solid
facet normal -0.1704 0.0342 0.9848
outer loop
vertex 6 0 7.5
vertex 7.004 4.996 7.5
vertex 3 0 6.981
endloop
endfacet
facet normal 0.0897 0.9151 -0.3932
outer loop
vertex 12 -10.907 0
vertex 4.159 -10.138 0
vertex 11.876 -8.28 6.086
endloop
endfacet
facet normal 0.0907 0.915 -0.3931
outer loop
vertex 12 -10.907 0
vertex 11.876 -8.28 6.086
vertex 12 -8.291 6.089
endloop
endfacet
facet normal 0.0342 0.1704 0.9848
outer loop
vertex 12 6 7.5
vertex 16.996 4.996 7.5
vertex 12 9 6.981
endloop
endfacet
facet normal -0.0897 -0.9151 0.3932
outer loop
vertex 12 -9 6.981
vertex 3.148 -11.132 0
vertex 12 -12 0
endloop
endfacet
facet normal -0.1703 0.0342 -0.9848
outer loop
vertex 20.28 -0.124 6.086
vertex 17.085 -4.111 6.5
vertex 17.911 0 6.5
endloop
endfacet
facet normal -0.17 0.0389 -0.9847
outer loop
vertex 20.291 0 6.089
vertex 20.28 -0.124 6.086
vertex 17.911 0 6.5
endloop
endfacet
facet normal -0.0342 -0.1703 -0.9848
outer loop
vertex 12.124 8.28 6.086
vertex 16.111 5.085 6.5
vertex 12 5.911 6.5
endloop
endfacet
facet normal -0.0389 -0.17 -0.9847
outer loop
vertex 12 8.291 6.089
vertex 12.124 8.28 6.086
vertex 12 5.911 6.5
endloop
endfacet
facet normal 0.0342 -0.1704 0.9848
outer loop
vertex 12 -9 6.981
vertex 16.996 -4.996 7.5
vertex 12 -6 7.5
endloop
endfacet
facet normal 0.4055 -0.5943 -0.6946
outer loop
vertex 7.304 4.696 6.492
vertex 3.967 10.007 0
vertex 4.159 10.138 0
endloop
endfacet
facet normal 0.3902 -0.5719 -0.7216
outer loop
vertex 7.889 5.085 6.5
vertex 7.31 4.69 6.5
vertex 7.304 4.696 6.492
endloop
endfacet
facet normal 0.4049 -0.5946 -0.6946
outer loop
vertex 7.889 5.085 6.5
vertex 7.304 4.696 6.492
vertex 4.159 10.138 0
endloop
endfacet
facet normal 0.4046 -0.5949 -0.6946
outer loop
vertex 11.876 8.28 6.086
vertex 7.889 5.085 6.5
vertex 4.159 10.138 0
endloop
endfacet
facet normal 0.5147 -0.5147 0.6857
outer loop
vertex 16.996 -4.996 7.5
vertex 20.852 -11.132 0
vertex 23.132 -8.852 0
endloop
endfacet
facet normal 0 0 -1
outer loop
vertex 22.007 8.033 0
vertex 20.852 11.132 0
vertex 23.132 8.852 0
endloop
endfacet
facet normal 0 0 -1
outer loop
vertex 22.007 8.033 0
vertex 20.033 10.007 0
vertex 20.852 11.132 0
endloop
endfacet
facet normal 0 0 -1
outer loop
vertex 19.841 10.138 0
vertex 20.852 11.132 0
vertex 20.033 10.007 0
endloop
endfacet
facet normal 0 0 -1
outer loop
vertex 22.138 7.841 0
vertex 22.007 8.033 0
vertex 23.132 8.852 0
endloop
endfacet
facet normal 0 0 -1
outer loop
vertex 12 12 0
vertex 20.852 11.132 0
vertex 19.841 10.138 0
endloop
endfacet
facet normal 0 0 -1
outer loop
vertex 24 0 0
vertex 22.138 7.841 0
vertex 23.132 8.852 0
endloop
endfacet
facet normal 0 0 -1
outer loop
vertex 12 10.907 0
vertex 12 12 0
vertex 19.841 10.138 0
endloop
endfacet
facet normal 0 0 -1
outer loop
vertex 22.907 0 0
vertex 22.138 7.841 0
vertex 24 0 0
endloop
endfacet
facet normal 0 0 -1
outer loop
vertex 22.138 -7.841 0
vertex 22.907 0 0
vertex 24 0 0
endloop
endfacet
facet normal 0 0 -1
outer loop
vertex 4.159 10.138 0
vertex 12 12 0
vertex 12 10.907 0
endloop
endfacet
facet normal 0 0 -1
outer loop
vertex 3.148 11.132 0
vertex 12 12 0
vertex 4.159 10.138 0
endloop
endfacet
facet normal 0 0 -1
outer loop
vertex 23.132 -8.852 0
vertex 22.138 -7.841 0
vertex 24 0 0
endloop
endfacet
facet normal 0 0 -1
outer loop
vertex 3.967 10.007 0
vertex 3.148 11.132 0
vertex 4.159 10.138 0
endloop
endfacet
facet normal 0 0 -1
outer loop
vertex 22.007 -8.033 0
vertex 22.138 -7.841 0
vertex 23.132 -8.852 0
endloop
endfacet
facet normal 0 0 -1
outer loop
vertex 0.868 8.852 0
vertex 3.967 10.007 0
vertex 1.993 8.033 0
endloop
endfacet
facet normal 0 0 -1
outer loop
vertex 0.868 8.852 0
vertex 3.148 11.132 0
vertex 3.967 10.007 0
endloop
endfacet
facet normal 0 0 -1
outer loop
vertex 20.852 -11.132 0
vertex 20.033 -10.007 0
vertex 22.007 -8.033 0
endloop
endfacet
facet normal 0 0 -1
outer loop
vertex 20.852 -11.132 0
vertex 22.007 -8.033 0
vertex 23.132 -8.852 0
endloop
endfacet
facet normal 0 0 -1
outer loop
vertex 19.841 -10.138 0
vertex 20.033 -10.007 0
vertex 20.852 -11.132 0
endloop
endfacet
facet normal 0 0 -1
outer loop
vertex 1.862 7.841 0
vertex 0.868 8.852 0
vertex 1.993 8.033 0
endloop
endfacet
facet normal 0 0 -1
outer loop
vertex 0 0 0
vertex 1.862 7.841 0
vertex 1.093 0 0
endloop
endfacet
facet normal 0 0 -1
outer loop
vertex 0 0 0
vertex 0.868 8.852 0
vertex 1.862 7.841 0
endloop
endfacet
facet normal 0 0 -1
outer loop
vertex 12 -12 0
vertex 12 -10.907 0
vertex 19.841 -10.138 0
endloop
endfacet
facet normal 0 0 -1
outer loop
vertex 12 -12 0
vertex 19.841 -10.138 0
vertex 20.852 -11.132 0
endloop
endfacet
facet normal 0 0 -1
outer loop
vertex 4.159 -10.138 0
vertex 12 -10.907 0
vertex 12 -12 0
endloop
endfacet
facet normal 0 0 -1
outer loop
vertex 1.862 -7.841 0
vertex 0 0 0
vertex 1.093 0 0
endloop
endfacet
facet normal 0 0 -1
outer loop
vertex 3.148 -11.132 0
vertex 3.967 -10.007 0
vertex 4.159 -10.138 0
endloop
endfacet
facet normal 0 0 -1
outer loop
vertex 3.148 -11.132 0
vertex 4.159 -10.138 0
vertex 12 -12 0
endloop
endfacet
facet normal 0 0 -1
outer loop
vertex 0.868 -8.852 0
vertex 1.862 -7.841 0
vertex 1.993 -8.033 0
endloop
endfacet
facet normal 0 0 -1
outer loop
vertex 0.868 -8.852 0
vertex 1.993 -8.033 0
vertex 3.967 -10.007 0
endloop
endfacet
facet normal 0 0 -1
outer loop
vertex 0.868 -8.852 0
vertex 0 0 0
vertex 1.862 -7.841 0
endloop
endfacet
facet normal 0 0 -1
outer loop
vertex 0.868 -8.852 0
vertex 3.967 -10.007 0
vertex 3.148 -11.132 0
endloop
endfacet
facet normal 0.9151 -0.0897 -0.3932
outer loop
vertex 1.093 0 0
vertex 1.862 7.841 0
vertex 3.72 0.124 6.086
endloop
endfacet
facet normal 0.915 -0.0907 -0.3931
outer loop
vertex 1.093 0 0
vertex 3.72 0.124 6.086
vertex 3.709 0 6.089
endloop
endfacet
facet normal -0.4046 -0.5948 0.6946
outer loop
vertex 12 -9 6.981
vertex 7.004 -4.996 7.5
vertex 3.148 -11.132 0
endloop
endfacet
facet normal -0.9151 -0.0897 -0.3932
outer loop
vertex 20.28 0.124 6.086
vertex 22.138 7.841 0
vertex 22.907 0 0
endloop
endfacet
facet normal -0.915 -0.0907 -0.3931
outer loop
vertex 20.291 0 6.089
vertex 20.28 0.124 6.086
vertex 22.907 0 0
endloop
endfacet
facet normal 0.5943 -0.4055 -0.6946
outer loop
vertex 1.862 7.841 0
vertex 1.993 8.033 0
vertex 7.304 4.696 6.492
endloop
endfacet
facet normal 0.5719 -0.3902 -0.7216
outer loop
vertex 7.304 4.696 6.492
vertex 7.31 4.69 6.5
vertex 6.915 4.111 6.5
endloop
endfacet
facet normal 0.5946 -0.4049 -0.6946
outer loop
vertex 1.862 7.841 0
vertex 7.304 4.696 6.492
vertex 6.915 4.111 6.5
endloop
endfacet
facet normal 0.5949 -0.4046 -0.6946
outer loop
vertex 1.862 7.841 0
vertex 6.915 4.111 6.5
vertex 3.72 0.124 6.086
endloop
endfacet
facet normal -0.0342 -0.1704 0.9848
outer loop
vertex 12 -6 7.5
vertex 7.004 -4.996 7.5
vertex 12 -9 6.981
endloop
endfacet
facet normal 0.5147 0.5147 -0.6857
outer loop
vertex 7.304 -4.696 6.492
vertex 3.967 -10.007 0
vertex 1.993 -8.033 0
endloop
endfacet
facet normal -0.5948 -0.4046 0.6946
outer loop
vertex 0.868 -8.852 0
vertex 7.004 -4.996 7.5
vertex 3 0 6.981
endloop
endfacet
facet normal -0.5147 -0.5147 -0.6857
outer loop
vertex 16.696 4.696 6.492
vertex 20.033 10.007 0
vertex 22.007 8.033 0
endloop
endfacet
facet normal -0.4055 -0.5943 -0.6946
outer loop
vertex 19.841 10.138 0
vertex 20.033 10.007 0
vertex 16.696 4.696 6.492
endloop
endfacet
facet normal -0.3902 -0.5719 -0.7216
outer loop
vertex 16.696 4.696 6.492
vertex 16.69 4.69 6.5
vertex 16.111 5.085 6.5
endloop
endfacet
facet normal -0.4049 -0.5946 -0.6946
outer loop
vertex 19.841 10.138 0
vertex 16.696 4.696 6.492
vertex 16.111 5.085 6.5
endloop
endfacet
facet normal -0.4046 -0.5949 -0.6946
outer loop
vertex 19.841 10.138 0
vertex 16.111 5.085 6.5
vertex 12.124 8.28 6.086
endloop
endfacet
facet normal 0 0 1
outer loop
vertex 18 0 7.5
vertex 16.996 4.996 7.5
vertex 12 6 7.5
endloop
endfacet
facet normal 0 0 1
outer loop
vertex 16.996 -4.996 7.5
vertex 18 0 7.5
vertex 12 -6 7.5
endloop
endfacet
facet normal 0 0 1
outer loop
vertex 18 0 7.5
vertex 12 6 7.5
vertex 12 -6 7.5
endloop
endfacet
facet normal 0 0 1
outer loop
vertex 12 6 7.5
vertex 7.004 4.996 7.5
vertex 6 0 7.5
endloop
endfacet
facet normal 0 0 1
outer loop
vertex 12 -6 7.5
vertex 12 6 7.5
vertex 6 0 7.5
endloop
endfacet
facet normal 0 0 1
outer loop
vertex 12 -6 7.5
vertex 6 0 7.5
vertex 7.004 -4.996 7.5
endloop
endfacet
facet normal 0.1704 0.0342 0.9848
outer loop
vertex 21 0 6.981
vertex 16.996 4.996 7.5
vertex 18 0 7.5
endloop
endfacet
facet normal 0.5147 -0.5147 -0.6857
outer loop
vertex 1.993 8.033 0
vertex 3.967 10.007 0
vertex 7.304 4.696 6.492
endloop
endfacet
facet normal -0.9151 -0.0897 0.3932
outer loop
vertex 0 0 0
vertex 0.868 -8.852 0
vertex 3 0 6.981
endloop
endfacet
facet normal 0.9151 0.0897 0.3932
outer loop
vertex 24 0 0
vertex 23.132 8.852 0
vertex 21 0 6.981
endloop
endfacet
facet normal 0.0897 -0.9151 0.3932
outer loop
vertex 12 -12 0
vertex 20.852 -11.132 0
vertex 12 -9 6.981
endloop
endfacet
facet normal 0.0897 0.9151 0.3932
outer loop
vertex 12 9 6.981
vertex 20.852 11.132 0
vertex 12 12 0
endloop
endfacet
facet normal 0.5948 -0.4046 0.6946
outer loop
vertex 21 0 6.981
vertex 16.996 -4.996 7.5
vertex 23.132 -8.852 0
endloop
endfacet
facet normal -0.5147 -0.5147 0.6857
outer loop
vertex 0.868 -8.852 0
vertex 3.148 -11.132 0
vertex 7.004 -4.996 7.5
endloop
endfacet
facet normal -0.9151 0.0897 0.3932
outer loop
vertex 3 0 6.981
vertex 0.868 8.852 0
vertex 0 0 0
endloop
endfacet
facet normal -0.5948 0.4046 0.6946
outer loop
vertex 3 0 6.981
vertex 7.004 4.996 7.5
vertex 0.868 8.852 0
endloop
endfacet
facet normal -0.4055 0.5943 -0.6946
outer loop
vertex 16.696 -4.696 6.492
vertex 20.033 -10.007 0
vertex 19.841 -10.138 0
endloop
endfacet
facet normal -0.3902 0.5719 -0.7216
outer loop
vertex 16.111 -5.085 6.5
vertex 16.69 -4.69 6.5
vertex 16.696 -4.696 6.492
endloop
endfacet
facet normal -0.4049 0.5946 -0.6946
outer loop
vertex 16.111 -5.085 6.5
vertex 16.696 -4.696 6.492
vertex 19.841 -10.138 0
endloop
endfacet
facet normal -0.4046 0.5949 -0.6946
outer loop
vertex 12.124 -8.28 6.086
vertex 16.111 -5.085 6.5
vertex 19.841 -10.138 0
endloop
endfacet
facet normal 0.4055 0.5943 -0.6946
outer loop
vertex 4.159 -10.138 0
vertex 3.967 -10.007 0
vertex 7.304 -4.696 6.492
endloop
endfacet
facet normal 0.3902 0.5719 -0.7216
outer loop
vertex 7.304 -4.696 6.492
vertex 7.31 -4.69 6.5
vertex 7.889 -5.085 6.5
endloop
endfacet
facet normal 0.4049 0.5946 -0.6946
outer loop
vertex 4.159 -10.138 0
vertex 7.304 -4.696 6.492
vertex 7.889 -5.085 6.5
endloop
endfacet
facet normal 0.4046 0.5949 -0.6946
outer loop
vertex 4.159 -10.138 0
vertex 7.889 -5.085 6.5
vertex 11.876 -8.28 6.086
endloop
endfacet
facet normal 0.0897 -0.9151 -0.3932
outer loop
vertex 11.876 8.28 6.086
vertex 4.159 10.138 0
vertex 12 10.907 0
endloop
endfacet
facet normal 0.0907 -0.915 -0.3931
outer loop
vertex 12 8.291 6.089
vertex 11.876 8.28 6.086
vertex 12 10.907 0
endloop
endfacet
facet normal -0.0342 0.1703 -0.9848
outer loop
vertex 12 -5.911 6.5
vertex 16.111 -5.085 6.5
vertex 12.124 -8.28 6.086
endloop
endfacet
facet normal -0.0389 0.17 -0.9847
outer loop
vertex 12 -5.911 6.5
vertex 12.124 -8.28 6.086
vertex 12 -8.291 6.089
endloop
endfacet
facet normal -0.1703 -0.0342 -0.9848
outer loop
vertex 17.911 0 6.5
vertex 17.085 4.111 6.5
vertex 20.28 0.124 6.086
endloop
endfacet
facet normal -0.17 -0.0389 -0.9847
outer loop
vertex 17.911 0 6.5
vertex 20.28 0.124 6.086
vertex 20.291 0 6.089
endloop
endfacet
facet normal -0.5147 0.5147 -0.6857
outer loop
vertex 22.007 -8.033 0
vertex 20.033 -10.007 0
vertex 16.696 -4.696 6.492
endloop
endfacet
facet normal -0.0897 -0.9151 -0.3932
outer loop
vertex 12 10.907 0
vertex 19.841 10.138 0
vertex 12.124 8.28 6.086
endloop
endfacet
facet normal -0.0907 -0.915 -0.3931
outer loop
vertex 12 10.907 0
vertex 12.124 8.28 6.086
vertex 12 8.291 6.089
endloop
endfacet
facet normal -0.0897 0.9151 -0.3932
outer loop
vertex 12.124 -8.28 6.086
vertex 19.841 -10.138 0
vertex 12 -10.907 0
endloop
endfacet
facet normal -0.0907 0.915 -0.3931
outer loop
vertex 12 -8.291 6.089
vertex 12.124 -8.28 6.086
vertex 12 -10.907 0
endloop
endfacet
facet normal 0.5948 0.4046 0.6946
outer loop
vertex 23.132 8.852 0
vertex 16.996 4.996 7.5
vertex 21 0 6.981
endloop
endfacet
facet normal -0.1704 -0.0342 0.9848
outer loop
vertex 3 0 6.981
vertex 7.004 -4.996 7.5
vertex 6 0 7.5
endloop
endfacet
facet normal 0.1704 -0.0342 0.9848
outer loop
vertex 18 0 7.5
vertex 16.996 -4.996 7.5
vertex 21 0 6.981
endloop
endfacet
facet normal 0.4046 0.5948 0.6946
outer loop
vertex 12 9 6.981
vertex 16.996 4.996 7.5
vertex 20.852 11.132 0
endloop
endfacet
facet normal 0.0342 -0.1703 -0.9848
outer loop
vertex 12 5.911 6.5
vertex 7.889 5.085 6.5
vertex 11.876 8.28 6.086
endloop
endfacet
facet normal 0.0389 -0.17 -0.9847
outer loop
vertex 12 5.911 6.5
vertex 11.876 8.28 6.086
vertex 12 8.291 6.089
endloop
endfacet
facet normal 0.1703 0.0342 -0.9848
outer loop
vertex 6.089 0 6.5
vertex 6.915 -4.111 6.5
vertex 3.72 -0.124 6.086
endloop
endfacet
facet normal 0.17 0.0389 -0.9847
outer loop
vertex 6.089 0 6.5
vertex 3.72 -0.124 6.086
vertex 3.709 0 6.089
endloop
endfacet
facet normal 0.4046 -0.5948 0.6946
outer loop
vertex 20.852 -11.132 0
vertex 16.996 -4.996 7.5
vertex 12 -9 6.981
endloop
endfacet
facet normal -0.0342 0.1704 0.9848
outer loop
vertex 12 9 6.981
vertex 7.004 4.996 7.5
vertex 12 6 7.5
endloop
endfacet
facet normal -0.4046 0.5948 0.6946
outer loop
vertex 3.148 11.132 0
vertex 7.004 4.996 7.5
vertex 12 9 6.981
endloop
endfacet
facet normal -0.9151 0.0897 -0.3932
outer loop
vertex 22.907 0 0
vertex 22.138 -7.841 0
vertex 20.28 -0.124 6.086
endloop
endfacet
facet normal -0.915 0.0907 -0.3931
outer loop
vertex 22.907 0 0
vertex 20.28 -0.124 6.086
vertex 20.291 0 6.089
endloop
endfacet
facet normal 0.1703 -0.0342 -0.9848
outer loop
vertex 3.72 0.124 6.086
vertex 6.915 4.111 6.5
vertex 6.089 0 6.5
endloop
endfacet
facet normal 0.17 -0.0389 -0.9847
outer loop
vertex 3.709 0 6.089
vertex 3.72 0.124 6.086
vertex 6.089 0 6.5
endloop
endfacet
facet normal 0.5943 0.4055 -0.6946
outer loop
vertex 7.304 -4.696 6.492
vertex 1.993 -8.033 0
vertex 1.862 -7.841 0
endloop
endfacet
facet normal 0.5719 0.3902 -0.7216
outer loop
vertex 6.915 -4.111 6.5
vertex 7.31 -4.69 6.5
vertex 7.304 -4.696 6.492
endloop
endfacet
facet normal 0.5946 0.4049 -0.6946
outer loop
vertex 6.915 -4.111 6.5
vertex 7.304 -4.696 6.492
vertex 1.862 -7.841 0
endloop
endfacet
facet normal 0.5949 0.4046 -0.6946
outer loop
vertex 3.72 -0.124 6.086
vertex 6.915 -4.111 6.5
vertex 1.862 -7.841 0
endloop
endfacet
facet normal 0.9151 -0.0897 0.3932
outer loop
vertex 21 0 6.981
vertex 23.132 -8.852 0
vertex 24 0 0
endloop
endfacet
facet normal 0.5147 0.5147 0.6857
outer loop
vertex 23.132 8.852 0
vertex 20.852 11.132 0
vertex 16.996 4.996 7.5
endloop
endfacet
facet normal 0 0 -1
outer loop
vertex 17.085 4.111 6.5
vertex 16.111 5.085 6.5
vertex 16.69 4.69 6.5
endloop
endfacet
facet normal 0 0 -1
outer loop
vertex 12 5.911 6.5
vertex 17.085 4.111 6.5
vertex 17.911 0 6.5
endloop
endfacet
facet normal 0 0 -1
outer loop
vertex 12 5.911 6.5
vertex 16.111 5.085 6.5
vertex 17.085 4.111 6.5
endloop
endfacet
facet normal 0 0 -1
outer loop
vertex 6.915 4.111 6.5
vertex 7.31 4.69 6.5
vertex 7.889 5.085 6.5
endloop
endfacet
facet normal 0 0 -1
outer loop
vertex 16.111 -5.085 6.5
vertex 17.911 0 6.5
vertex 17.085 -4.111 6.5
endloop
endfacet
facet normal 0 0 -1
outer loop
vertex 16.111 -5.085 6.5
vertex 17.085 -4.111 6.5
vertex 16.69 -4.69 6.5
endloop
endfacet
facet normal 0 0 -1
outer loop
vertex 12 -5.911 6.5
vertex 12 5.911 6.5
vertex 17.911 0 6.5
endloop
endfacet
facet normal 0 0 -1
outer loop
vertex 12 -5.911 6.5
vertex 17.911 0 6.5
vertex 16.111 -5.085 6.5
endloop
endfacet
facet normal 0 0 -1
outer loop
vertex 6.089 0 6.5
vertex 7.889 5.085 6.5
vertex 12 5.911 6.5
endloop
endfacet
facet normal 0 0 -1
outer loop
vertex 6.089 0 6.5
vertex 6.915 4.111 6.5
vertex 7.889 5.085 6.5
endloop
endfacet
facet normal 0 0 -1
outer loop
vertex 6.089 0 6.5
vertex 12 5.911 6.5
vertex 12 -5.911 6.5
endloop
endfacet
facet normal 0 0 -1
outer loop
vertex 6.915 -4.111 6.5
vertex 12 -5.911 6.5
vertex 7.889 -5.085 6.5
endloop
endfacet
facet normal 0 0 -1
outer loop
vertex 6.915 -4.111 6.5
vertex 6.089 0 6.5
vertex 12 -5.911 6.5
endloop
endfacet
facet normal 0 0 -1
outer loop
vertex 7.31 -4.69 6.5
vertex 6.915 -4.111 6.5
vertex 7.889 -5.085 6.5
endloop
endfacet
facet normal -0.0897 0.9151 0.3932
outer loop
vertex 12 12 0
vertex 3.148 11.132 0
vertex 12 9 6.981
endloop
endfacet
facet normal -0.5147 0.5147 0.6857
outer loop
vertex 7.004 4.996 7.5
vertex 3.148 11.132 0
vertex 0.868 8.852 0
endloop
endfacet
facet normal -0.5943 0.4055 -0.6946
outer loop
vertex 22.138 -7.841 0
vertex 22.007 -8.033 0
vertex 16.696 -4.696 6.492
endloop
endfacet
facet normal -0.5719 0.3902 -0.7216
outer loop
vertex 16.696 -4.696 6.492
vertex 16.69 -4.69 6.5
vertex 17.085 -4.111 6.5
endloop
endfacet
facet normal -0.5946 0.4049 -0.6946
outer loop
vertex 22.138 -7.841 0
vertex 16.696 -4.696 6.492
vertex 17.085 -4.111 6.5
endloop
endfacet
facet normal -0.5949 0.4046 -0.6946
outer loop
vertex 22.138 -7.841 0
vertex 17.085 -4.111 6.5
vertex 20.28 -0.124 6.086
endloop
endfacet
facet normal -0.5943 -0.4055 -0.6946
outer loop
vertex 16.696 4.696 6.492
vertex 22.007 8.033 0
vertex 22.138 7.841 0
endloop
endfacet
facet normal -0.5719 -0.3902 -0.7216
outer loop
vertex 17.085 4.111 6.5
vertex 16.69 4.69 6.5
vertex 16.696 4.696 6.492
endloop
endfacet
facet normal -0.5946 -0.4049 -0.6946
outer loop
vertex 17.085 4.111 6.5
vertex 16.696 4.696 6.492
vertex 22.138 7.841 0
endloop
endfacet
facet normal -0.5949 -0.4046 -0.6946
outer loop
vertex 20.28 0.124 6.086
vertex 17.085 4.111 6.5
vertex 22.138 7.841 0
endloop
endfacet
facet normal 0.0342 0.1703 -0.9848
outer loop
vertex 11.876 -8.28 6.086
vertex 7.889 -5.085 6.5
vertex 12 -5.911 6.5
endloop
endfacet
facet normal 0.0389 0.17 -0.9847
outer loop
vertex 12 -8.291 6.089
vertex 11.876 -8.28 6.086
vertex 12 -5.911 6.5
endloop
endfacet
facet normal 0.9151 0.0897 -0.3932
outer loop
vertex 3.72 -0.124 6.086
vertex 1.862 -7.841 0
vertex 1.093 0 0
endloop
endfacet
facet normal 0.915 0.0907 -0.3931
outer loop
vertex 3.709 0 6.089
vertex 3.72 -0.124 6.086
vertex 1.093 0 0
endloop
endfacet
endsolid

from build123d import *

# Parameters (mm, degrees)
F1_DEPTH  = 8.5
F3_DEPTH  = 1
F5_W      = 21.3351653656
F5_H      = 16.6395662818
F6_DEPTH  = 25.4
F8_W      = 32.5405728072
F8_H      = 36.5617219359
F9_DEPTH  = 25.4
F12_W     = 39.0807809308
F12_H     = 30.5973365903
F13_DEPTH = 25.4
F15_W     = 34.2101305723
F15_H     = 32.0557234809
F16_DEPTH = 25.4
F18_W     = 10.4850952048
F18_H     = 24.5708920993
F19_DEPTH = 25.4
F23_T     = -1


with BuildPart() as f1:
    # F0 (on Top) → F1 (new body)
    with BuildSketch(Plane.XY):
        Polygon((12, -12), (12, 0), (2.0081724885, -9.9918275115), (3.148298335, -11.131953358), align=None)
    extrude(amount=F1_DEPTH)

    # F2 (on face) → F3 (cut)
    with BuildSketch(Plane.XY.offset(8.5)):
        Polygon((12, -6), (12, 0), (7.0040862443, -4.9959137557), align=None)
    extrude(amount=-F3_DEPTH, mode=Mode.SUBTRACT)

    # F5 (on face) → F6 (cut)
    with BuildSketch(Plane(origin=(-0.2736218822, -1.3614281972, 7.8754394827), x_dir=(0.999414466, -0.0058284524, 0.033715788), z_dir=(-0.0342158621, -0.170243838, 0.984807753))):
        with Locations((9.1339054634, -6.3430479495)):
            Rectangle(F5_W, F5_H)
    extrude(amount=F6_DEPTH, mode=Mode.SUBTRACT)

    # F8 (on 3pt) → F9 (cut)
    with BuildSketch(Plane(origin=(-2.047796356, -1.8446305737, 2.5928305655), x_dir=(0.8409146633, -0.3137144476, 0.44096006), z_dir=(-0.5411677458, -0.4874774616, 0.6852030322))):
        with Locations((12.2363092378, -5.4249586537)):
            Rectangle(F8_W, F8_H)
    extrude(amount=F9_DEPTH, mode=Mode.SUBTRACT)

    # F12 (on 3pt) → F13 (cut)
    with BuildSketch(Plane(origin=(-2.1635826482, -3.1806122044, 3.7144904348), x_dir=(0.9144921522, -0.2631581438, 0.3073302701), z_dir=(-0.4046036376, -0.5947945963, 0.6946332016))):
        with Locations((12.1668963693, -3.5860668868)):
            Rectangle(F12_W, F12_H)
    extrude(amount=F13_DEPTH, mode=Mode.SUBTRACT)

    # F15 (on 3pt) → F16 (cut)
    with BuildSketch(Plane(origin=(-0.8887297085, -9.0626123757, 3.8943302941), x_dir=(0.995965621, -0.0824459089, 0.0354281511), z_dir=(-0.0897356216, -0.9150579155, 0.393213084))):
        with Locations((12.4972742051, -3.3018724062)):
            Rectangle(F15_W, F15_H)
    extrude(amount=F16_DEPTH, mode=Mode.SUBTRACT)

    # F18 (on 3pt) → F19 (cut)
    with BuildSketch(Plane(origin=(-2.1149465474, -2.1149465474, 2.8176241463), x_dir=(0.8573741534, -0.3089777782, 0.4116336886), z_dir=(0.5146936574, 0.5146936574, -0.6856973662))):
        with Locations((7.849192596, 5.699301837)):
            Rectangle(F18_W, F18_H)
    extrude(amount=-F19_DEPTH, mode=Mode.SUBTRACT)

    # F20: F1 across face


with BuildPart() as f1_1:
    add(f1.part)
    add(f1.part.mirror(Plane(origin=(8.1142893011, -3.8857106989, 3.3333333333), x_dir=(-0.7071067812, -0.7071067812, 0), z_dir=(-0.7071067812, 0.7071067812, 0))))

    # F21: F1 across face


with BuildPart() as f1_2:
    add(f1_1.part)
    add(f1_1.part.mirror(Plane(origin=(12, -5.2108536925, 3.5209267252), x_dir=(0, 1, 0), z_dir=(1, 0, 0))))

    # F22: F1 across face


with BuildPart() as f1_3:
    add(f1_2.part)
    add(f1_2.part.mirror(Plane(origin=(12, 0, 3.5209267252), x_dir=(-1, 0, 0), z_dir=(0, 1, 0))))

    # F23
    f23_openings = [f1_3.faces().sort_by_distance(p)[0] for p in [
        (12, 0, 0),
    ]]
    offset(amount=F23_T, openings=f23_openings)


solid = f1_3.part
